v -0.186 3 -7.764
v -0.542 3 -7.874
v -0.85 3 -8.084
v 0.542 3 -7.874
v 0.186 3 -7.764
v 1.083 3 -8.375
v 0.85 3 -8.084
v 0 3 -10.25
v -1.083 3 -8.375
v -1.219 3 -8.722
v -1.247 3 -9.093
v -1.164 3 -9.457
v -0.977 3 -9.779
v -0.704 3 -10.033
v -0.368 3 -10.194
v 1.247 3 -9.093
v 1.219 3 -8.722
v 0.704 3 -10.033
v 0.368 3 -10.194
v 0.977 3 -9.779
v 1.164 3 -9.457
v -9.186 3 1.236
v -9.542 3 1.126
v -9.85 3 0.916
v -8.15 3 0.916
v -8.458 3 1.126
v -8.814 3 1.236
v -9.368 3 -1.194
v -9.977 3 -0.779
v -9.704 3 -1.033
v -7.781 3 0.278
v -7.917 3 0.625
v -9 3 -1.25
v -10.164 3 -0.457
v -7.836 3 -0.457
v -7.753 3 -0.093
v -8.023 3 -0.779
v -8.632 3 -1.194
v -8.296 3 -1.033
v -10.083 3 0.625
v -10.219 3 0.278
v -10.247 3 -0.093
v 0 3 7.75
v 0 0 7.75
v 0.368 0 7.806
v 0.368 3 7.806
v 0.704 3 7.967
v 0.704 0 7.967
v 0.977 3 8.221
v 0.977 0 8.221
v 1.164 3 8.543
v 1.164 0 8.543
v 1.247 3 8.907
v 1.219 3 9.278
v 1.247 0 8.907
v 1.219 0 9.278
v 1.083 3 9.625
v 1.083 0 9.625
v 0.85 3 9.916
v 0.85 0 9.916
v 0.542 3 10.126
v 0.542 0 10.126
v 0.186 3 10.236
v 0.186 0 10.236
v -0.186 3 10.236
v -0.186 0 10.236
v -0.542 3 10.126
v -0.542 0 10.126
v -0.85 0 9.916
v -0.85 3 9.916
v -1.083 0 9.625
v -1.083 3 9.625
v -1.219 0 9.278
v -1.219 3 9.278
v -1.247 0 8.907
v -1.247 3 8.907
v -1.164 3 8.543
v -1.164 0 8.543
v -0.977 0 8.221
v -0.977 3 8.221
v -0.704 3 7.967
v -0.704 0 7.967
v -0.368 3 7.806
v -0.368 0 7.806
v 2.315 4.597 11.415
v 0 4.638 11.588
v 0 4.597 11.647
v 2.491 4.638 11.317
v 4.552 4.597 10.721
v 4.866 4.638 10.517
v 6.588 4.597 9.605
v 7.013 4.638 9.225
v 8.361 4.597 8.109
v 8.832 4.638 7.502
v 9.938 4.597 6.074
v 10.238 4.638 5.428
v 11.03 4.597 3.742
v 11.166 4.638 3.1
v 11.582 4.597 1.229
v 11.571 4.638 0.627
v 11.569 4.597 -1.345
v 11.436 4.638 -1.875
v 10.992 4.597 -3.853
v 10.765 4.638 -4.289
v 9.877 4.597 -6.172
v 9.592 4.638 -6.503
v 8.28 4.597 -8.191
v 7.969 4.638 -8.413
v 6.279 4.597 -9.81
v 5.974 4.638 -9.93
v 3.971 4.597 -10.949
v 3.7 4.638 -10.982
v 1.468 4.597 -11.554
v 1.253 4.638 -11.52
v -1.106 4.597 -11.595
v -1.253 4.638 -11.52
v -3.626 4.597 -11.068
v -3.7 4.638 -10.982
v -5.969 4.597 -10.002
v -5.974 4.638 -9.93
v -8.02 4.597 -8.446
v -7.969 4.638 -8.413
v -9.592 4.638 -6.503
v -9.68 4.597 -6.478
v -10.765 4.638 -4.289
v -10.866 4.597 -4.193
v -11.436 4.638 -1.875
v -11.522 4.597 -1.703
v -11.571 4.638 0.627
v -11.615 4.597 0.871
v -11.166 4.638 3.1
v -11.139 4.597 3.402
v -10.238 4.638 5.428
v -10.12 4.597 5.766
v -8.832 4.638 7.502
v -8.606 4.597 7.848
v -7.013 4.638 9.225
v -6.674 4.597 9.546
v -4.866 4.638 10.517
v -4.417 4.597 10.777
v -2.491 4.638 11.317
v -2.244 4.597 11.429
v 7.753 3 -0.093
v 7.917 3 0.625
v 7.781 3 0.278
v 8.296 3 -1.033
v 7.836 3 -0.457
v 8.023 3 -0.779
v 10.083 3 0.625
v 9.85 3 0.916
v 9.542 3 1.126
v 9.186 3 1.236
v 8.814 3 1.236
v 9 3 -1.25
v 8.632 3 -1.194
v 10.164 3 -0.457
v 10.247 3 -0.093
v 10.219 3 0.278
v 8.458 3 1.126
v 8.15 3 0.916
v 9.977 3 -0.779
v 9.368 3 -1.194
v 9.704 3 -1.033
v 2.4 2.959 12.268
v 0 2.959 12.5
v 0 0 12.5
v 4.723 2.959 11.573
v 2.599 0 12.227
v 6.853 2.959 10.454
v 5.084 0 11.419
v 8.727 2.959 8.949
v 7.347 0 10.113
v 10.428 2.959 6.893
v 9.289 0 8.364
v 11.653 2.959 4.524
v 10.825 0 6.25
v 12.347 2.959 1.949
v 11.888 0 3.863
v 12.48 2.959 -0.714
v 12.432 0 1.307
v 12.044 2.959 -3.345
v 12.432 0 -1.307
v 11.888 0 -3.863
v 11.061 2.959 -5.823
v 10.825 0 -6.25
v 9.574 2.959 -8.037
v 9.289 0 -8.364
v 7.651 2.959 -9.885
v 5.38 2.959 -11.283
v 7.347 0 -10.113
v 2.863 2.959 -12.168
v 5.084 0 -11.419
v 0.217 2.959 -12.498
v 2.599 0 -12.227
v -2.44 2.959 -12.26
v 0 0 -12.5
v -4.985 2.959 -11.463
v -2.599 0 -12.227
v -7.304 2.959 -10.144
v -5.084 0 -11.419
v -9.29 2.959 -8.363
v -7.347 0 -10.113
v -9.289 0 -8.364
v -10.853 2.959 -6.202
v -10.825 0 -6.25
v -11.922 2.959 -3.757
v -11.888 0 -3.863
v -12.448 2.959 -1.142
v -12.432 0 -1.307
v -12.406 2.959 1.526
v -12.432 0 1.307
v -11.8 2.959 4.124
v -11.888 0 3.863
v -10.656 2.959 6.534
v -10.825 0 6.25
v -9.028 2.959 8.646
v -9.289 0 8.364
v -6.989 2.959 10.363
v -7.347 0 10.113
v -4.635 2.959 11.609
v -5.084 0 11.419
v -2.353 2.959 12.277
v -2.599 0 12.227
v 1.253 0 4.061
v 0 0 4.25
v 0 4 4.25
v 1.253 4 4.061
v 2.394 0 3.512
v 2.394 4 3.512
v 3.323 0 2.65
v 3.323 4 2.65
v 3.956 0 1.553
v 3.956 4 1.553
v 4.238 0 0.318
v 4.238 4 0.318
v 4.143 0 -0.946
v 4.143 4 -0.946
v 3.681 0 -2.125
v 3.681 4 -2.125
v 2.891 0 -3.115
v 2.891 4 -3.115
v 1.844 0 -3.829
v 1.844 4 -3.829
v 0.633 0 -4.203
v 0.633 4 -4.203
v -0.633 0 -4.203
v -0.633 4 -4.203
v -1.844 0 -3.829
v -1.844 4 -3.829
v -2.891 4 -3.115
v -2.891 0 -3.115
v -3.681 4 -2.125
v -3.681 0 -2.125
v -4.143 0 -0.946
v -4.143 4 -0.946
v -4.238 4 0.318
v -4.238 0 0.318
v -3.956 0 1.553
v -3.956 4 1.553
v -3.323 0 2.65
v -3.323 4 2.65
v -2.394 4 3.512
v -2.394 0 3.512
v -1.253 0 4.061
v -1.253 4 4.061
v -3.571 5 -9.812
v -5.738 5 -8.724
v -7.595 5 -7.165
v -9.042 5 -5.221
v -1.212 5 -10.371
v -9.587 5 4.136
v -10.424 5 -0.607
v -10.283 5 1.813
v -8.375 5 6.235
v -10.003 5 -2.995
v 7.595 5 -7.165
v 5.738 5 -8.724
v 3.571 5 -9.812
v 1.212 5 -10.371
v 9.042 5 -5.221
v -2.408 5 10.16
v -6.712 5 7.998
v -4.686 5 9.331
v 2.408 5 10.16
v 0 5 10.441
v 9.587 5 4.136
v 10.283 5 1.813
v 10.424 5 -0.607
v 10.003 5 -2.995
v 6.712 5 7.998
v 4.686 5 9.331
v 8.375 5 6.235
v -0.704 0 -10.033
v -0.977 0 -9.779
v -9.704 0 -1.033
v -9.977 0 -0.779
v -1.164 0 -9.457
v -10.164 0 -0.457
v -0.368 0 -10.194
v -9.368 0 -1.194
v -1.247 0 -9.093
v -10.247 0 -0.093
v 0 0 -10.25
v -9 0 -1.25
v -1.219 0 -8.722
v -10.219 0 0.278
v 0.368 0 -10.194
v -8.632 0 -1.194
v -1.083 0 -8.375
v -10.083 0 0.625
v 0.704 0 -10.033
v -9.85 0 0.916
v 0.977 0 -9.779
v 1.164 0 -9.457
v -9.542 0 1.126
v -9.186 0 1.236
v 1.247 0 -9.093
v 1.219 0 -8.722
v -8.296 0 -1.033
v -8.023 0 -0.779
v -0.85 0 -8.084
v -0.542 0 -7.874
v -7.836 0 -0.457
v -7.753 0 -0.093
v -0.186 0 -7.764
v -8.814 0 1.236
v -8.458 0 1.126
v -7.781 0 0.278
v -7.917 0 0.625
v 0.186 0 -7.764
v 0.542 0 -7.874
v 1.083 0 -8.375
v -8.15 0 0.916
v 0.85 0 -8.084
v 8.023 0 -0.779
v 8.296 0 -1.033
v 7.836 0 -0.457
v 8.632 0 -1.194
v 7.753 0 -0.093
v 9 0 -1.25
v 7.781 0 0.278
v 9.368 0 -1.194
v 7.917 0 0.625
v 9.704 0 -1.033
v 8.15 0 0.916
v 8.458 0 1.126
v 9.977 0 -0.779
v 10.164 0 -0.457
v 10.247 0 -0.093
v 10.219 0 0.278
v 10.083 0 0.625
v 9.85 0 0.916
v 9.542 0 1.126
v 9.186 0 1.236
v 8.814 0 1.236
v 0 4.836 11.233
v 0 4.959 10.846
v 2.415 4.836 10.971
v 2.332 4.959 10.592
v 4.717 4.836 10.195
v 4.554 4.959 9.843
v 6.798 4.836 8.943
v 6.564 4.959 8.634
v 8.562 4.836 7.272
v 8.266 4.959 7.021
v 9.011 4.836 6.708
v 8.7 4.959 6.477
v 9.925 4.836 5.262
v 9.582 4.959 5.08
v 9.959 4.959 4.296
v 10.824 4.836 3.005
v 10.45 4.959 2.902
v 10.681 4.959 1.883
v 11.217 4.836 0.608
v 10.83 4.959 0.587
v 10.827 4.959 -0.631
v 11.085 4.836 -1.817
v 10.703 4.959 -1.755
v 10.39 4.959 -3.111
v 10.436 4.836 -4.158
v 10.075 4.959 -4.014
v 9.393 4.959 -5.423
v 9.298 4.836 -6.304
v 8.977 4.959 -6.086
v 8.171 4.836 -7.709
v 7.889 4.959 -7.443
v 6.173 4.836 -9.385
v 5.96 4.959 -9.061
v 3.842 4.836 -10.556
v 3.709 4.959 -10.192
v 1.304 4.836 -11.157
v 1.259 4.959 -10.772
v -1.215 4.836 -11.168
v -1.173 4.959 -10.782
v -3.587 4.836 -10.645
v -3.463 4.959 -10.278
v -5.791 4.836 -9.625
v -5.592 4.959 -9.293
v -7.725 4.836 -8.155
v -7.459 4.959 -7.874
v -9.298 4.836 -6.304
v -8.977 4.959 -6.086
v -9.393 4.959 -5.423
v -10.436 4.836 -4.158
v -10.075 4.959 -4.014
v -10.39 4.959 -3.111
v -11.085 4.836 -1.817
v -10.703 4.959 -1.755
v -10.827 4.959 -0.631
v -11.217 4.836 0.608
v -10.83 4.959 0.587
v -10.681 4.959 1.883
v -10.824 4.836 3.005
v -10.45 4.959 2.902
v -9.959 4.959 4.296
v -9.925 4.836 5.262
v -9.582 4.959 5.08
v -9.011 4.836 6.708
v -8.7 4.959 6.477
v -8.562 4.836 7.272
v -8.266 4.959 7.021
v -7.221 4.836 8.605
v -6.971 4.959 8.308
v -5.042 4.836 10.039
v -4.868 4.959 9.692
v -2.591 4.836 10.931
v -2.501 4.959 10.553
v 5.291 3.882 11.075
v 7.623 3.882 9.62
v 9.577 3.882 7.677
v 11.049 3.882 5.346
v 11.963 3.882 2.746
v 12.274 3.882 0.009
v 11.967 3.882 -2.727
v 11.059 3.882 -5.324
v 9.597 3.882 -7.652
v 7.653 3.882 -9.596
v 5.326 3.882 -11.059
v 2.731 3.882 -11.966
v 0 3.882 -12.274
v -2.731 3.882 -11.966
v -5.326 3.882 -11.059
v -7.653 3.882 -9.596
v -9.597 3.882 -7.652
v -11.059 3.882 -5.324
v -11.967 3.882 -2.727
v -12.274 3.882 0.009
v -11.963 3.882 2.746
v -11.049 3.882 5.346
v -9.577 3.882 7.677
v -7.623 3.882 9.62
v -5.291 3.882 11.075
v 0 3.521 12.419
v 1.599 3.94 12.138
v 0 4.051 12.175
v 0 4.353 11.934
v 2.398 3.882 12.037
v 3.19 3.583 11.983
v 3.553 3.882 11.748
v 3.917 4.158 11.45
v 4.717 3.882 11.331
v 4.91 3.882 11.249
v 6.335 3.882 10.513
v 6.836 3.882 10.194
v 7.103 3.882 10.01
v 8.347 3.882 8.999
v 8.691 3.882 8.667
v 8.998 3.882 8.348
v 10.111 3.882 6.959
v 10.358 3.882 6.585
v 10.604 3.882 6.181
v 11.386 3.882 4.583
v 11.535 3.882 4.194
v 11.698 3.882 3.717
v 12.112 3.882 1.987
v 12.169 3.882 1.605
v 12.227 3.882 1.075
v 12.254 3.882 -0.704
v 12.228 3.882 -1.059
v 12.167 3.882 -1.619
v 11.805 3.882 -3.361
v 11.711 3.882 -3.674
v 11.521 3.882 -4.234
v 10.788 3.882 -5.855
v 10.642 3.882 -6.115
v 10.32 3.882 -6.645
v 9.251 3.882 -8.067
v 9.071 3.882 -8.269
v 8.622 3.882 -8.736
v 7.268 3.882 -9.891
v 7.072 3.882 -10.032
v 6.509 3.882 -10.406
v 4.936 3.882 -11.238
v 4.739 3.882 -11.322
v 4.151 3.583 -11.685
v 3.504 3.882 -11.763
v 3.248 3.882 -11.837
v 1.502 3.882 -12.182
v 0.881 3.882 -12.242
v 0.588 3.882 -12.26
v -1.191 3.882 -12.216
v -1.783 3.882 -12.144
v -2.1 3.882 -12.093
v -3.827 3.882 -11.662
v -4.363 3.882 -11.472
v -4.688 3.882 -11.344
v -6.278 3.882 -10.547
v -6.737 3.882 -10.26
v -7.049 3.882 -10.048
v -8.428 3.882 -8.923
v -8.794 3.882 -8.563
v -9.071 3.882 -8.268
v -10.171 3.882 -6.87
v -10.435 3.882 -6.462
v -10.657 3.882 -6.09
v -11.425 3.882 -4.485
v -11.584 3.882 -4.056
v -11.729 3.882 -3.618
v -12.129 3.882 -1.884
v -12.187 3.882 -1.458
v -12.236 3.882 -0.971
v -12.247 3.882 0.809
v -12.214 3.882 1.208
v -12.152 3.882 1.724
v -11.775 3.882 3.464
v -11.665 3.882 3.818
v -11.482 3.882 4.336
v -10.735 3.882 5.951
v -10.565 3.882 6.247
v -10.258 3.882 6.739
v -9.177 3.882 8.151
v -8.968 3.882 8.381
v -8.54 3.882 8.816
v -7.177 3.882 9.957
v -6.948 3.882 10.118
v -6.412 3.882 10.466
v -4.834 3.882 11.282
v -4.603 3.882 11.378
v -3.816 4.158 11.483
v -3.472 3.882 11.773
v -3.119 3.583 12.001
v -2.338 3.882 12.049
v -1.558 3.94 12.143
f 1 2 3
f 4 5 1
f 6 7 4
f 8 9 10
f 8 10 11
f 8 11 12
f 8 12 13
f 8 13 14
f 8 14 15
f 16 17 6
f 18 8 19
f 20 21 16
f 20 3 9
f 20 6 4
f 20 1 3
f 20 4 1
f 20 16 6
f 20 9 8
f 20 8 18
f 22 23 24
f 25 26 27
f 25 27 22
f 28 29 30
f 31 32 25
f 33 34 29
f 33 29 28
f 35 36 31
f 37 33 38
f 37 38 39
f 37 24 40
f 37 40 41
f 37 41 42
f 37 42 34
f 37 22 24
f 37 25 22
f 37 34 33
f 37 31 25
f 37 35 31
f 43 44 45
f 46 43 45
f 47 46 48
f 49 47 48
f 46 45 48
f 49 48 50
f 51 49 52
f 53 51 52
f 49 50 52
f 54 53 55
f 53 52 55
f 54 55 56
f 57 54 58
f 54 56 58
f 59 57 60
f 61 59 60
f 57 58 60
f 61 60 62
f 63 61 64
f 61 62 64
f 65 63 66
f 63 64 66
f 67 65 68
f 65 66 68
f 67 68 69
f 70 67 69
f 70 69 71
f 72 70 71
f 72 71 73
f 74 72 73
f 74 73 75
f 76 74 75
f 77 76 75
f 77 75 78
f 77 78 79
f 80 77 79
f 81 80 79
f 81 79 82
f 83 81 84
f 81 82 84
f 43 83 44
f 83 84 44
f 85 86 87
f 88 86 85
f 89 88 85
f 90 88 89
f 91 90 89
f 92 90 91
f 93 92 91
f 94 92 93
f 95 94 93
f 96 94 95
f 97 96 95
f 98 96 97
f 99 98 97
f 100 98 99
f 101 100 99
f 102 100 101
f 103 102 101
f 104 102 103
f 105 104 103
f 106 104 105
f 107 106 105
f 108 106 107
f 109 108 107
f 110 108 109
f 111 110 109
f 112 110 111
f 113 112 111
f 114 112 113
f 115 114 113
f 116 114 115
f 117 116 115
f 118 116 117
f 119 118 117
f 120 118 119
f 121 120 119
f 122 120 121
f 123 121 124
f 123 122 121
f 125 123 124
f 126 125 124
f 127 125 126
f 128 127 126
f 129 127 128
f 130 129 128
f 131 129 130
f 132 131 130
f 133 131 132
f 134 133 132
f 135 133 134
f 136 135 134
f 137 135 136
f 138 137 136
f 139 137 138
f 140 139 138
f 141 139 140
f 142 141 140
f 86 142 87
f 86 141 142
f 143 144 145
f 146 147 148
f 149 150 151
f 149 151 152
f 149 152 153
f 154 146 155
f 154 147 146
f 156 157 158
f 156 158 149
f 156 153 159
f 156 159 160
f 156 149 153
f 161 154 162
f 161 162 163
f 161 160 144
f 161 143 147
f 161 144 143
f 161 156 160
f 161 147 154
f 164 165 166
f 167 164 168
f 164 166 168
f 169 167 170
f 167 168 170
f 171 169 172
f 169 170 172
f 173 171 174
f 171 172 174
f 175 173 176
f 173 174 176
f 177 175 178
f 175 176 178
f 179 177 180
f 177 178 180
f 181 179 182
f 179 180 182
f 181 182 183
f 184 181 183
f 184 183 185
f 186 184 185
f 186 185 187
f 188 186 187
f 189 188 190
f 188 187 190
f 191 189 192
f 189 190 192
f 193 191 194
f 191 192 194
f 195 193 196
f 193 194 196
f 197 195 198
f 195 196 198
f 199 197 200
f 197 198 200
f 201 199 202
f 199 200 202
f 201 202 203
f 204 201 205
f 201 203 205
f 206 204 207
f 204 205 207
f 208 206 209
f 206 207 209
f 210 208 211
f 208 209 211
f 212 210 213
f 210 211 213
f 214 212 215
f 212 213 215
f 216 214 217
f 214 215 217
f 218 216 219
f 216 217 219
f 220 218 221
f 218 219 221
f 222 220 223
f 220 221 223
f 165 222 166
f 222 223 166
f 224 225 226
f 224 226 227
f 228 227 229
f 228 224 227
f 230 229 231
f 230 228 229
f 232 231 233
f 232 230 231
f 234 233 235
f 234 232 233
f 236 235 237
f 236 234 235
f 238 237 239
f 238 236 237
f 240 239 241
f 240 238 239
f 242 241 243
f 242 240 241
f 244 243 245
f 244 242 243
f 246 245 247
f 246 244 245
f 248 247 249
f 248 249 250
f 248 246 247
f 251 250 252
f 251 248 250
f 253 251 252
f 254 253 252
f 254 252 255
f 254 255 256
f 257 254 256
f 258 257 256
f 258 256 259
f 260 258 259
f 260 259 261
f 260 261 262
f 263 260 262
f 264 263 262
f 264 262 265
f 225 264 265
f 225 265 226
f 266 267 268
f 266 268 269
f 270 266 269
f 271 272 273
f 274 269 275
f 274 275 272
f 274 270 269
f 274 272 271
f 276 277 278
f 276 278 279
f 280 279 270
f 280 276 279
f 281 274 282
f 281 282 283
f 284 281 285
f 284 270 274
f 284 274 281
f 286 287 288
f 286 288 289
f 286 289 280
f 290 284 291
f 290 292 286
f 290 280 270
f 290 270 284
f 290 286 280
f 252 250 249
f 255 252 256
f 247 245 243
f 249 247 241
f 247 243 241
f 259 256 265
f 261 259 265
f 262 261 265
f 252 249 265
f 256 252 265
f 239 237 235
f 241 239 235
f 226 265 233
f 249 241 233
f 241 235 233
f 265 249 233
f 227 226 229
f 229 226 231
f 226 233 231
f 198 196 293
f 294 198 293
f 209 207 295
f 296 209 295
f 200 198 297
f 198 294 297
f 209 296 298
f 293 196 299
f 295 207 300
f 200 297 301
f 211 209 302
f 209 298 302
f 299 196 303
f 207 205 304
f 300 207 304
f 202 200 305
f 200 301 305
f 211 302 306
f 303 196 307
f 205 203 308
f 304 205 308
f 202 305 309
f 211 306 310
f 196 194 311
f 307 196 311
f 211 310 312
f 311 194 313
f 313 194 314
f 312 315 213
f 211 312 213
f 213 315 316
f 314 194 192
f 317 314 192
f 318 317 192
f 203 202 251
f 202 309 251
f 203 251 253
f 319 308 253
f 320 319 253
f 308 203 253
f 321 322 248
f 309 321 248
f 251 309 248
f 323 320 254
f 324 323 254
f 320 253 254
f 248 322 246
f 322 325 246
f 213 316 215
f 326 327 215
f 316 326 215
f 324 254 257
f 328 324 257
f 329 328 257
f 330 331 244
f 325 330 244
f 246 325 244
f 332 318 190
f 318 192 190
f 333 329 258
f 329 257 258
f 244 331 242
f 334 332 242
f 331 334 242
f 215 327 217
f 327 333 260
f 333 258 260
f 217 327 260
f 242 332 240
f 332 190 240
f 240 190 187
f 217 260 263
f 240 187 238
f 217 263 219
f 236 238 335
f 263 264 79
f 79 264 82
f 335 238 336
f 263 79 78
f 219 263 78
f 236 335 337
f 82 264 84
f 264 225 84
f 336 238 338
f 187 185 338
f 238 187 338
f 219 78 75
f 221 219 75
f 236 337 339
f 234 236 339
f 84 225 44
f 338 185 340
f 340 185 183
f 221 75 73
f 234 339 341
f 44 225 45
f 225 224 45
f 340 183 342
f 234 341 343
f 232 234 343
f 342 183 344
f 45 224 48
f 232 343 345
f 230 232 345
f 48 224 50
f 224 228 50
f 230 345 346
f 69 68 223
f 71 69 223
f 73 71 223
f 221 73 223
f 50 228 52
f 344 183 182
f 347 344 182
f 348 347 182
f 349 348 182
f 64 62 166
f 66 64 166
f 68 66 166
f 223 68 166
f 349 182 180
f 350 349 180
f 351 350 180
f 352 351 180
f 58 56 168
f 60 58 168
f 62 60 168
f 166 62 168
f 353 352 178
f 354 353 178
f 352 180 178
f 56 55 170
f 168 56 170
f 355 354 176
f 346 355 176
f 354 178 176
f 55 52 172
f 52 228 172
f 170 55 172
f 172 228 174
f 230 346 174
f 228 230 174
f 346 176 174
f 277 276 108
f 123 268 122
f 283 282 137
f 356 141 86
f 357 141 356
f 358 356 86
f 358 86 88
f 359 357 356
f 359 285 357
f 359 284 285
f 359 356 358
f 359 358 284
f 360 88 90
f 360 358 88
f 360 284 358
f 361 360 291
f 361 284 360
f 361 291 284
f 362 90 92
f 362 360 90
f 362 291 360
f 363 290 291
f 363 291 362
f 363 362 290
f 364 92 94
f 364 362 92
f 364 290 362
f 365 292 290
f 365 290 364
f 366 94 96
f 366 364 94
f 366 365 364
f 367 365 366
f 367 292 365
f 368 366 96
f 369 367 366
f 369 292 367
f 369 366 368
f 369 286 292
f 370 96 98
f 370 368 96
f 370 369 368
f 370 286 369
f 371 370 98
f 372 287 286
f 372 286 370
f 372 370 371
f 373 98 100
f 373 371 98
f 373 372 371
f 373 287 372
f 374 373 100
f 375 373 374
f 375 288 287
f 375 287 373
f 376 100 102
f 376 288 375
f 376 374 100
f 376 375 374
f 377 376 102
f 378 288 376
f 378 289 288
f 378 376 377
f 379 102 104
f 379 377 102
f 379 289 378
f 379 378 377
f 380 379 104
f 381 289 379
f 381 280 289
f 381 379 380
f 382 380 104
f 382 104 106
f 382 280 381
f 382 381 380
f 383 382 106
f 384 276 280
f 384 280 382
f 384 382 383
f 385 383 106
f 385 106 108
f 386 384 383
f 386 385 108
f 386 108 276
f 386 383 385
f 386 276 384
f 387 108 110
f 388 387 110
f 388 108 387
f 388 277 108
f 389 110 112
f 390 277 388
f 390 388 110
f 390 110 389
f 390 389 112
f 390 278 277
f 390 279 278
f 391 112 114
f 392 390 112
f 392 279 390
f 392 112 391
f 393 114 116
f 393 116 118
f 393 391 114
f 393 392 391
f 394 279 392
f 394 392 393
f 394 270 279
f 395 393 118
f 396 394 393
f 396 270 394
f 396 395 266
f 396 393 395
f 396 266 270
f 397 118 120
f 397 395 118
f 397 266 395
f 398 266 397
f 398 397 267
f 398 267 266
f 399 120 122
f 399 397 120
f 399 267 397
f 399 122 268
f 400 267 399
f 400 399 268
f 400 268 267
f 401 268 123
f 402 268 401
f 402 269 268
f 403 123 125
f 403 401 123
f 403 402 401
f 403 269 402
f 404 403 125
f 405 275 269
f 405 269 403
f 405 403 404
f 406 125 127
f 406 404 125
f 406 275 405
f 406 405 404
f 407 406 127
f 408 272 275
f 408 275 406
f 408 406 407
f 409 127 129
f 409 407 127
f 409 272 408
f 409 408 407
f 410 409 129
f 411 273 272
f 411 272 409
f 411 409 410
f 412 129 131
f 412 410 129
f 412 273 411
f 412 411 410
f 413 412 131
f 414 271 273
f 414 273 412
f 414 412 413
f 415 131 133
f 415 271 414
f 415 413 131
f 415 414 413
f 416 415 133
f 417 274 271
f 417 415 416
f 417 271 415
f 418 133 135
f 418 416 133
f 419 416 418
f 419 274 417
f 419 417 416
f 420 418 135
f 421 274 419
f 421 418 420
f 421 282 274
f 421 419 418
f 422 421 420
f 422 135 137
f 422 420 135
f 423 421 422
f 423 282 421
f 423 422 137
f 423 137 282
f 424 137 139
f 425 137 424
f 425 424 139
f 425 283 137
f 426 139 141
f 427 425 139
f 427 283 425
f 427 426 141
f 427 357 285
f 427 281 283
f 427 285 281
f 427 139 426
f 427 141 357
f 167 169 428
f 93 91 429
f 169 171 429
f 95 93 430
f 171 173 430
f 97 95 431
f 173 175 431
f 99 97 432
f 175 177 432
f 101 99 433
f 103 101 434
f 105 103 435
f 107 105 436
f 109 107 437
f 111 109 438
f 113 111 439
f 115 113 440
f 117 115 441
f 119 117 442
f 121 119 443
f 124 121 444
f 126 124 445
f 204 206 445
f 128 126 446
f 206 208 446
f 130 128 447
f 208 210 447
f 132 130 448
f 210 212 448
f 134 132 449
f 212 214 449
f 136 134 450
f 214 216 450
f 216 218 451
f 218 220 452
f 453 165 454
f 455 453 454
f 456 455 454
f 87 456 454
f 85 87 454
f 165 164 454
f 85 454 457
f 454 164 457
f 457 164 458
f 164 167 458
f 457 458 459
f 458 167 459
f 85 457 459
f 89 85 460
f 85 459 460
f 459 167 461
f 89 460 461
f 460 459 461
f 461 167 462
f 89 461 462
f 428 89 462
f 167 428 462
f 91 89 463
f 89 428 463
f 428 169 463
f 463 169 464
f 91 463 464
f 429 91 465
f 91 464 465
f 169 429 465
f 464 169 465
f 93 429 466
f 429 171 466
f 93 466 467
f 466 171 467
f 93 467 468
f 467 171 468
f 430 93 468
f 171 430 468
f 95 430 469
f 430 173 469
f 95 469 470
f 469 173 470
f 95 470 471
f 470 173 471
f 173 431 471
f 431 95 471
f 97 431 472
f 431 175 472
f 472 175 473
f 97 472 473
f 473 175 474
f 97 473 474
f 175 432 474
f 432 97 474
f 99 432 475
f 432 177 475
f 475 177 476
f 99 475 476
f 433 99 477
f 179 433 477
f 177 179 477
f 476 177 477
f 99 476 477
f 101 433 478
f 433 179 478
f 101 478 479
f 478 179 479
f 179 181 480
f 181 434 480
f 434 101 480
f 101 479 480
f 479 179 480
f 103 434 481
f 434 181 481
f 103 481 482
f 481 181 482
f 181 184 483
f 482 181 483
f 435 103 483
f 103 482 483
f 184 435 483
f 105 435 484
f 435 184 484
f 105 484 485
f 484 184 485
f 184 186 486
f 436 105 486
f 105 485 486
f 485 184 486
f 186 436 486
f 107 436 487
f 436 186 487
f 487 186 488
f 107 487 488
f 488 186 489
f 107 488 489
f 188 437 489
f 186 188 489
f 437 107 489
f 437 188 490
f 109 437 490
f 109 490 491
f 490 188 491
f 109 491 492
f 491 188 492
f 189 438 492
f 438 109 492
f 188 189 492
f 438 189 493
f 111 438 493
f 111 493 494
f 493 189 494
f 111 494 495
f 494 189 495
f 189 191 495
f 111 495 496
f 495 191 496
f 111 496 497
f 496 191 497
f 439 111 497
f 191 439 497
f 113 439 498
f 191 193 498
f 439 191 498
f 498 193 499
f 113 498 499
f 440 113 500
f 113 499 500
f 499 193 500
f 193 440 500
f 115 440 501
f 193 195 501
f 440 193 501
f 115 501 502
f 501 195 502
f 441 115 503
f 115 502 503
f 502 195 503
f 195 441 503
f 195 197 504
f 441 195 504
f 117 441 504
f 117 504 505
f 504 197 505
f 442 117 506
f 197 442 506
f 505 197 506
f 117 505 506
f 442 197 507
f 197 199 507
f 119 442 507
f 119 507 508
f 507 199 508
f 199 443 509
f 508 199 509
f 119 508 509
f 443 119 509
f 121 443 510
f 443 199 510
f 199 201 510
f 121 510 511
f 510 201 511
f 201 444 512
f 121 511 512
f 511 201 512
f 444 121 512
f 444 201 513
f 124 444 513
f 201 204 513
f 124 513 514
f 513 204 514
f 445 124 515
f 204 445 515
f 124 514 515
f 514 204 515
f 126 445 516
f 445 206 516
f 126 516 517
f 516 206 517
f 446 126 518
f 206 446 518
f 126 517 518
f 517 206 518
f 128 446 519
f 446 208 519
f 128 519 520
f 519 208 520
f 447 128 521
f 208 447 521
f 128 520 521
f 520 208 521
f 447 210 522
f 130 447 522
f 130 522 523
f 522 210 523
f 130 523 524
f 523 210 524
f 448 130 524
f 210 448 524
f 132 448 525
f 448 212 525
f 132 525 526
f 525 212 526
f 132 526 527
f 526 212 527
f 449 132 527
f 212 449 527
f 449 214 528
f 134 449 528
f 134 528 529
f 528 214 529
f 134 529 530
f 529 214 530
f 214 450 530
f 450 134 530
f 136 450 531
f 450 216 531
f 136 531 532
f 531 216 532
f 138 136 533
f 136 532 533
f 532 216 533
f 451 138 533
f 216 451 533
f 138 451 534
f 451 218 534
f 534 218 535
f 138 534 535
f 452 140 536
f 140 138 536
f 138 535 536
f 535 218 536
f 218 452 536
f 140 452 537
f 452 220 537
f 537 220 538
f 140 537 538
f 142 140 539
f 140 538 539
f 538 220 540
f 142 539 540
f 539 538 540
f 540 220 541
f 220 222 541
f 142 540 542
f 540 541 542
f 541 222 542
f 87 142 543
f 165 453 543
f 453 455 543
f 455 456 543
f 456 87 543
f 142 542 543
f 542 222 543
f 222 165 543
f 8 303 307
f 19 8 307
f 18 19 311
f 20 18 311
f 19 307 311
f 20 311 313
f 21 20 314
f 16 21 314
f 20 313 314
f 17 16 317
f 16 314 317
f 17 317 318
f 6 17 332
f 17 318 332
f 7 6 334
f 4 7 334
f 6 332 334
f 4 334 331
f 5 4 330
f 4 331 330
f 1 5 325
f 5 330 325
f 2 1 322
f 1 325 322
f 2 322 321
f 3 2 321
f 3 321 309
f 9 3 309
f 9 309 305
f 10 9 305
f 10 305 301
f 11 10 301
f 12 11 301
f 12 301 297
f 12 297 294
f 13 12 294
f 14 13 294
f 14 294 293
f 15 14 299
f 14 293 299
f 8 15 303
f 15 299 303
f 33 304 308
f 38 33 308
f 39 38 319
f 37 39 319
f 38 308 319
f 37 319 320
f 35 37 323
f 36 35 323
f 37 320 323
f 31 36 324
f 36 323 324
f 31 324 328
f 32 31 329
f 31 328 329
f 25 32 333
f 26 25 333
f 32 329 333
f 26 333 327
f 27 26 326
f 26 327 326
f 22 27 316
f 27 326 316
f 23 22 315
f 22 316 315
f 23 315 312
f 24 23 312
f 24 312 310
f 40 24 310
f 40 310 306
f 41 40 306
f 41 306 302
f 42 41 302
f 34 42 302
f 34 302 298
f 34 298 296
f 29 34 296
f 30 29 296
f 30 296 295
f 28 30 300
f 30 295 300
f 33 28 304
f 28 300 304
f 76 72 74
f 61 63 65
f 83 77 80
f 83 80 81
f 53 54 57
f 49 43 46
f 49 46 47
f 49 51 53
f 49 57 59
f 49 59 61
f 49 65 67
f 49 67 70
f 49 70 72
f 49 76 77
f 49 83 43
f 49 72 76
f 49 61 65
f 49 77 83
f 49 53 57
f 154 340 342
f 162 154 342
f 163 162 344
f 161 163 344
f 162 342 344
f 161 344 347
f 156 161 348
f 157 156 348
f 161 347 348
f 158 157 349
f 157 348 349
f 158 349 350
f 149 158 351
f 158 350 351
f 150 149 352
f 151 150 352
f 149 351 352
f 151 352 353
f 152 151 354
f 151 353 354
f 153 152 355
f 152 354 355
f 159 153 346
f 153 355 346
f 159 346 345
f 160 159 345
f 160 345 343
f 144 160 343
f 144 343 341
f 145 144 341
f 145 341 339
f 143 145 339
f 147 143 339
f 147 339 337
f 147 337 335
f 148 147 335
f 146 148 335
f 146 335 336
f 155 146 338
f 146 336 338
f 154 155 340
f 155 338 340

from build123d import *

# Parameters (mm, degrees)
SKETCH1_R           = 12.5
SKETCH1_R_2         = 4.25
BOSS_EXTRUDE1_DEPTH = 5
BOSS_EXTRUDE2_START = -1
SKETCH2_R           = 4.25
BOSS_EXTRUDE2_DEPTH = 1
SKETCH3_R           = 1.25
CUT_EXTRUDE1_DEPTH  = 3
CHAMFER1_SIZE       = 1
CHAMFER1_SIZE2      = 1.428148007
FILLET1_R           = 2


with BuildPart() as part:
    # Sketch1 → Boss-Extrude1 (new body)
    with BuildSketch(Plane(origin=(0, 0, 0), x_dir=(1, 0, 0), z_dir=(0, 1, 0))):
        with Locations(Location((0, 0, 0), (0, 0, 270))):
            Circle(SKETCH1_R)
        with Locations(Location((0, 0, 0), (0, 0, 270))):
            Circle(SKETCH1_R_2, mode=Mode.SUBTRACT)
    extrude(amount=BOSS_EXTRUDE1_DEPTH)

    # Sketch2 → Boss-Extrude2 (add)
    with BuildSketch(Plane(origin=(0, 5, 0), x_dir=(1, 0, 0), z_dir=(0, 1, 0)).offset(BOSS_EXTRUDE2_START)):
        with Locations(Location((0, 0, 0), (0, 0, 270))):
            Circle(SKETCH2_R)
    extrude(amount=BOSS_EXTRUDE2_DEPTH)

    # Sketch3 → Cut-Extrude1 (cut)
    with BuildSketch(Plane(origin=(0, 0, 0), x_dir=(-1, 0, 0), z_dir=(0, -1, 0))):
        with Locations(Location((0, -9, 0), (0, 0, 90))):
            Circle(SKETCH3_R)
        with Locations(Location((-9, 0, 0), (0, 0, 90))):
            Circle(SKETCH3_R)
        with Locations(Location((0, 9, 0), (0, 0, 90))):
            Circle(SKETCH3_R)
        with Locations(Location((9, 0, 0), (0, 0, 90))):
            Circle(SKETCH3_R)
    extrude(amount=-CUT_EXTRUDE1_DEPTH, mode=Mode.SUBTRACT)

    # Chamfer1
    chamfer1_edges = [part.edges().sort_by_distance(p)[0] for p in [
        (0, 5, -12.5),
    ]]
    chamfer1_side = [part.faces().sort_by_distance(p)[0] for p in [
        (0, 2.5, -12.5),
    ]]
    chamfer(chamfer1_edges, length=CHAMFER1_SIZE, length2=CHAMFER1_SIZE2, reference=chamfer1_side[0])

    # Fillet1
    fillet1_edges = [part.edges().sort_by_distance(p)[0] for p in [
        (0, 5, -11.071851993),
        (0, 4, -12.5),
    ]]
    fillet(fillet1_edges, radius=FILLET1_R)


solid = part.part
